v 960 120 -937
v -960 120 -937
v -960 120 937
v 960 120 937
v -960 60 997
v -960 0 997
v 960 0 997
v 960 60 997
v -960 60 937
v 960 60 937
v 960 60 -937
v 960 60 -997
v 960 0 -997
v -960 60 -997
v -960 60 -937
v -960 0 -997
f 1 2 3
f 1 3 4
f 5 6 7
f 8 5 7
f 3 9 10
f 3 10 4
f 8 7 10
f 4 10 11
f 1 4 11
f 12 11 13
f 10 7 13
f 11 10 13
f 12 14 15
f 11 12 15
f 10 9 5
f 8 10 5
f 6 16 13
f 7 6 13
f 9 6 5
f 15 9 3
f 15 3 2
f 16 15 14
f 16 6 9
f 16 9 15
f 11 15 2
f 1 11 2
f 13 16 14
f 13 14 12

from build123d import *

# Parameters (mm, degrees)
SKETCH1_W           = 1920
SKETCH1_H           = 1994
BOSS_EXTRUDE1_DEPTH = 120
SKETCH2_W           = 60
SKETCH2_H           = 60
CUT_EXTRUDE1_DEPTH  = 2167.750793239


with BuildPart() as part:
    # Sketch1 → Boss-Extrude1 (new body)
    with BuildSketch(Plane(origin=(0, 0, 0), x_dir=(1, 0, 0), z_dir=(0, 1, 0))):
        Rectangle(SKETCH1_W, SKETCH1_H)
    extrude(amount=BOSS_EXTRUDE1_DEPTH)

    # Sketch2 → Cut-Extrude1 (cut, through all)
    with BuildSketch(Plane.ZY.offset(960)):
        with Locations((-967, 90)):
            Rectangle(SKETCH2_W, SKETCH2_H)
        with Locations((967, 90)):
            Rectangle(SKETCH2_W, SKETCH2_H)
    extrude(amount=-CUT_EXTRUDE1_DEPTH, mode=Mode.SUBTRACT)


solid = part.part
